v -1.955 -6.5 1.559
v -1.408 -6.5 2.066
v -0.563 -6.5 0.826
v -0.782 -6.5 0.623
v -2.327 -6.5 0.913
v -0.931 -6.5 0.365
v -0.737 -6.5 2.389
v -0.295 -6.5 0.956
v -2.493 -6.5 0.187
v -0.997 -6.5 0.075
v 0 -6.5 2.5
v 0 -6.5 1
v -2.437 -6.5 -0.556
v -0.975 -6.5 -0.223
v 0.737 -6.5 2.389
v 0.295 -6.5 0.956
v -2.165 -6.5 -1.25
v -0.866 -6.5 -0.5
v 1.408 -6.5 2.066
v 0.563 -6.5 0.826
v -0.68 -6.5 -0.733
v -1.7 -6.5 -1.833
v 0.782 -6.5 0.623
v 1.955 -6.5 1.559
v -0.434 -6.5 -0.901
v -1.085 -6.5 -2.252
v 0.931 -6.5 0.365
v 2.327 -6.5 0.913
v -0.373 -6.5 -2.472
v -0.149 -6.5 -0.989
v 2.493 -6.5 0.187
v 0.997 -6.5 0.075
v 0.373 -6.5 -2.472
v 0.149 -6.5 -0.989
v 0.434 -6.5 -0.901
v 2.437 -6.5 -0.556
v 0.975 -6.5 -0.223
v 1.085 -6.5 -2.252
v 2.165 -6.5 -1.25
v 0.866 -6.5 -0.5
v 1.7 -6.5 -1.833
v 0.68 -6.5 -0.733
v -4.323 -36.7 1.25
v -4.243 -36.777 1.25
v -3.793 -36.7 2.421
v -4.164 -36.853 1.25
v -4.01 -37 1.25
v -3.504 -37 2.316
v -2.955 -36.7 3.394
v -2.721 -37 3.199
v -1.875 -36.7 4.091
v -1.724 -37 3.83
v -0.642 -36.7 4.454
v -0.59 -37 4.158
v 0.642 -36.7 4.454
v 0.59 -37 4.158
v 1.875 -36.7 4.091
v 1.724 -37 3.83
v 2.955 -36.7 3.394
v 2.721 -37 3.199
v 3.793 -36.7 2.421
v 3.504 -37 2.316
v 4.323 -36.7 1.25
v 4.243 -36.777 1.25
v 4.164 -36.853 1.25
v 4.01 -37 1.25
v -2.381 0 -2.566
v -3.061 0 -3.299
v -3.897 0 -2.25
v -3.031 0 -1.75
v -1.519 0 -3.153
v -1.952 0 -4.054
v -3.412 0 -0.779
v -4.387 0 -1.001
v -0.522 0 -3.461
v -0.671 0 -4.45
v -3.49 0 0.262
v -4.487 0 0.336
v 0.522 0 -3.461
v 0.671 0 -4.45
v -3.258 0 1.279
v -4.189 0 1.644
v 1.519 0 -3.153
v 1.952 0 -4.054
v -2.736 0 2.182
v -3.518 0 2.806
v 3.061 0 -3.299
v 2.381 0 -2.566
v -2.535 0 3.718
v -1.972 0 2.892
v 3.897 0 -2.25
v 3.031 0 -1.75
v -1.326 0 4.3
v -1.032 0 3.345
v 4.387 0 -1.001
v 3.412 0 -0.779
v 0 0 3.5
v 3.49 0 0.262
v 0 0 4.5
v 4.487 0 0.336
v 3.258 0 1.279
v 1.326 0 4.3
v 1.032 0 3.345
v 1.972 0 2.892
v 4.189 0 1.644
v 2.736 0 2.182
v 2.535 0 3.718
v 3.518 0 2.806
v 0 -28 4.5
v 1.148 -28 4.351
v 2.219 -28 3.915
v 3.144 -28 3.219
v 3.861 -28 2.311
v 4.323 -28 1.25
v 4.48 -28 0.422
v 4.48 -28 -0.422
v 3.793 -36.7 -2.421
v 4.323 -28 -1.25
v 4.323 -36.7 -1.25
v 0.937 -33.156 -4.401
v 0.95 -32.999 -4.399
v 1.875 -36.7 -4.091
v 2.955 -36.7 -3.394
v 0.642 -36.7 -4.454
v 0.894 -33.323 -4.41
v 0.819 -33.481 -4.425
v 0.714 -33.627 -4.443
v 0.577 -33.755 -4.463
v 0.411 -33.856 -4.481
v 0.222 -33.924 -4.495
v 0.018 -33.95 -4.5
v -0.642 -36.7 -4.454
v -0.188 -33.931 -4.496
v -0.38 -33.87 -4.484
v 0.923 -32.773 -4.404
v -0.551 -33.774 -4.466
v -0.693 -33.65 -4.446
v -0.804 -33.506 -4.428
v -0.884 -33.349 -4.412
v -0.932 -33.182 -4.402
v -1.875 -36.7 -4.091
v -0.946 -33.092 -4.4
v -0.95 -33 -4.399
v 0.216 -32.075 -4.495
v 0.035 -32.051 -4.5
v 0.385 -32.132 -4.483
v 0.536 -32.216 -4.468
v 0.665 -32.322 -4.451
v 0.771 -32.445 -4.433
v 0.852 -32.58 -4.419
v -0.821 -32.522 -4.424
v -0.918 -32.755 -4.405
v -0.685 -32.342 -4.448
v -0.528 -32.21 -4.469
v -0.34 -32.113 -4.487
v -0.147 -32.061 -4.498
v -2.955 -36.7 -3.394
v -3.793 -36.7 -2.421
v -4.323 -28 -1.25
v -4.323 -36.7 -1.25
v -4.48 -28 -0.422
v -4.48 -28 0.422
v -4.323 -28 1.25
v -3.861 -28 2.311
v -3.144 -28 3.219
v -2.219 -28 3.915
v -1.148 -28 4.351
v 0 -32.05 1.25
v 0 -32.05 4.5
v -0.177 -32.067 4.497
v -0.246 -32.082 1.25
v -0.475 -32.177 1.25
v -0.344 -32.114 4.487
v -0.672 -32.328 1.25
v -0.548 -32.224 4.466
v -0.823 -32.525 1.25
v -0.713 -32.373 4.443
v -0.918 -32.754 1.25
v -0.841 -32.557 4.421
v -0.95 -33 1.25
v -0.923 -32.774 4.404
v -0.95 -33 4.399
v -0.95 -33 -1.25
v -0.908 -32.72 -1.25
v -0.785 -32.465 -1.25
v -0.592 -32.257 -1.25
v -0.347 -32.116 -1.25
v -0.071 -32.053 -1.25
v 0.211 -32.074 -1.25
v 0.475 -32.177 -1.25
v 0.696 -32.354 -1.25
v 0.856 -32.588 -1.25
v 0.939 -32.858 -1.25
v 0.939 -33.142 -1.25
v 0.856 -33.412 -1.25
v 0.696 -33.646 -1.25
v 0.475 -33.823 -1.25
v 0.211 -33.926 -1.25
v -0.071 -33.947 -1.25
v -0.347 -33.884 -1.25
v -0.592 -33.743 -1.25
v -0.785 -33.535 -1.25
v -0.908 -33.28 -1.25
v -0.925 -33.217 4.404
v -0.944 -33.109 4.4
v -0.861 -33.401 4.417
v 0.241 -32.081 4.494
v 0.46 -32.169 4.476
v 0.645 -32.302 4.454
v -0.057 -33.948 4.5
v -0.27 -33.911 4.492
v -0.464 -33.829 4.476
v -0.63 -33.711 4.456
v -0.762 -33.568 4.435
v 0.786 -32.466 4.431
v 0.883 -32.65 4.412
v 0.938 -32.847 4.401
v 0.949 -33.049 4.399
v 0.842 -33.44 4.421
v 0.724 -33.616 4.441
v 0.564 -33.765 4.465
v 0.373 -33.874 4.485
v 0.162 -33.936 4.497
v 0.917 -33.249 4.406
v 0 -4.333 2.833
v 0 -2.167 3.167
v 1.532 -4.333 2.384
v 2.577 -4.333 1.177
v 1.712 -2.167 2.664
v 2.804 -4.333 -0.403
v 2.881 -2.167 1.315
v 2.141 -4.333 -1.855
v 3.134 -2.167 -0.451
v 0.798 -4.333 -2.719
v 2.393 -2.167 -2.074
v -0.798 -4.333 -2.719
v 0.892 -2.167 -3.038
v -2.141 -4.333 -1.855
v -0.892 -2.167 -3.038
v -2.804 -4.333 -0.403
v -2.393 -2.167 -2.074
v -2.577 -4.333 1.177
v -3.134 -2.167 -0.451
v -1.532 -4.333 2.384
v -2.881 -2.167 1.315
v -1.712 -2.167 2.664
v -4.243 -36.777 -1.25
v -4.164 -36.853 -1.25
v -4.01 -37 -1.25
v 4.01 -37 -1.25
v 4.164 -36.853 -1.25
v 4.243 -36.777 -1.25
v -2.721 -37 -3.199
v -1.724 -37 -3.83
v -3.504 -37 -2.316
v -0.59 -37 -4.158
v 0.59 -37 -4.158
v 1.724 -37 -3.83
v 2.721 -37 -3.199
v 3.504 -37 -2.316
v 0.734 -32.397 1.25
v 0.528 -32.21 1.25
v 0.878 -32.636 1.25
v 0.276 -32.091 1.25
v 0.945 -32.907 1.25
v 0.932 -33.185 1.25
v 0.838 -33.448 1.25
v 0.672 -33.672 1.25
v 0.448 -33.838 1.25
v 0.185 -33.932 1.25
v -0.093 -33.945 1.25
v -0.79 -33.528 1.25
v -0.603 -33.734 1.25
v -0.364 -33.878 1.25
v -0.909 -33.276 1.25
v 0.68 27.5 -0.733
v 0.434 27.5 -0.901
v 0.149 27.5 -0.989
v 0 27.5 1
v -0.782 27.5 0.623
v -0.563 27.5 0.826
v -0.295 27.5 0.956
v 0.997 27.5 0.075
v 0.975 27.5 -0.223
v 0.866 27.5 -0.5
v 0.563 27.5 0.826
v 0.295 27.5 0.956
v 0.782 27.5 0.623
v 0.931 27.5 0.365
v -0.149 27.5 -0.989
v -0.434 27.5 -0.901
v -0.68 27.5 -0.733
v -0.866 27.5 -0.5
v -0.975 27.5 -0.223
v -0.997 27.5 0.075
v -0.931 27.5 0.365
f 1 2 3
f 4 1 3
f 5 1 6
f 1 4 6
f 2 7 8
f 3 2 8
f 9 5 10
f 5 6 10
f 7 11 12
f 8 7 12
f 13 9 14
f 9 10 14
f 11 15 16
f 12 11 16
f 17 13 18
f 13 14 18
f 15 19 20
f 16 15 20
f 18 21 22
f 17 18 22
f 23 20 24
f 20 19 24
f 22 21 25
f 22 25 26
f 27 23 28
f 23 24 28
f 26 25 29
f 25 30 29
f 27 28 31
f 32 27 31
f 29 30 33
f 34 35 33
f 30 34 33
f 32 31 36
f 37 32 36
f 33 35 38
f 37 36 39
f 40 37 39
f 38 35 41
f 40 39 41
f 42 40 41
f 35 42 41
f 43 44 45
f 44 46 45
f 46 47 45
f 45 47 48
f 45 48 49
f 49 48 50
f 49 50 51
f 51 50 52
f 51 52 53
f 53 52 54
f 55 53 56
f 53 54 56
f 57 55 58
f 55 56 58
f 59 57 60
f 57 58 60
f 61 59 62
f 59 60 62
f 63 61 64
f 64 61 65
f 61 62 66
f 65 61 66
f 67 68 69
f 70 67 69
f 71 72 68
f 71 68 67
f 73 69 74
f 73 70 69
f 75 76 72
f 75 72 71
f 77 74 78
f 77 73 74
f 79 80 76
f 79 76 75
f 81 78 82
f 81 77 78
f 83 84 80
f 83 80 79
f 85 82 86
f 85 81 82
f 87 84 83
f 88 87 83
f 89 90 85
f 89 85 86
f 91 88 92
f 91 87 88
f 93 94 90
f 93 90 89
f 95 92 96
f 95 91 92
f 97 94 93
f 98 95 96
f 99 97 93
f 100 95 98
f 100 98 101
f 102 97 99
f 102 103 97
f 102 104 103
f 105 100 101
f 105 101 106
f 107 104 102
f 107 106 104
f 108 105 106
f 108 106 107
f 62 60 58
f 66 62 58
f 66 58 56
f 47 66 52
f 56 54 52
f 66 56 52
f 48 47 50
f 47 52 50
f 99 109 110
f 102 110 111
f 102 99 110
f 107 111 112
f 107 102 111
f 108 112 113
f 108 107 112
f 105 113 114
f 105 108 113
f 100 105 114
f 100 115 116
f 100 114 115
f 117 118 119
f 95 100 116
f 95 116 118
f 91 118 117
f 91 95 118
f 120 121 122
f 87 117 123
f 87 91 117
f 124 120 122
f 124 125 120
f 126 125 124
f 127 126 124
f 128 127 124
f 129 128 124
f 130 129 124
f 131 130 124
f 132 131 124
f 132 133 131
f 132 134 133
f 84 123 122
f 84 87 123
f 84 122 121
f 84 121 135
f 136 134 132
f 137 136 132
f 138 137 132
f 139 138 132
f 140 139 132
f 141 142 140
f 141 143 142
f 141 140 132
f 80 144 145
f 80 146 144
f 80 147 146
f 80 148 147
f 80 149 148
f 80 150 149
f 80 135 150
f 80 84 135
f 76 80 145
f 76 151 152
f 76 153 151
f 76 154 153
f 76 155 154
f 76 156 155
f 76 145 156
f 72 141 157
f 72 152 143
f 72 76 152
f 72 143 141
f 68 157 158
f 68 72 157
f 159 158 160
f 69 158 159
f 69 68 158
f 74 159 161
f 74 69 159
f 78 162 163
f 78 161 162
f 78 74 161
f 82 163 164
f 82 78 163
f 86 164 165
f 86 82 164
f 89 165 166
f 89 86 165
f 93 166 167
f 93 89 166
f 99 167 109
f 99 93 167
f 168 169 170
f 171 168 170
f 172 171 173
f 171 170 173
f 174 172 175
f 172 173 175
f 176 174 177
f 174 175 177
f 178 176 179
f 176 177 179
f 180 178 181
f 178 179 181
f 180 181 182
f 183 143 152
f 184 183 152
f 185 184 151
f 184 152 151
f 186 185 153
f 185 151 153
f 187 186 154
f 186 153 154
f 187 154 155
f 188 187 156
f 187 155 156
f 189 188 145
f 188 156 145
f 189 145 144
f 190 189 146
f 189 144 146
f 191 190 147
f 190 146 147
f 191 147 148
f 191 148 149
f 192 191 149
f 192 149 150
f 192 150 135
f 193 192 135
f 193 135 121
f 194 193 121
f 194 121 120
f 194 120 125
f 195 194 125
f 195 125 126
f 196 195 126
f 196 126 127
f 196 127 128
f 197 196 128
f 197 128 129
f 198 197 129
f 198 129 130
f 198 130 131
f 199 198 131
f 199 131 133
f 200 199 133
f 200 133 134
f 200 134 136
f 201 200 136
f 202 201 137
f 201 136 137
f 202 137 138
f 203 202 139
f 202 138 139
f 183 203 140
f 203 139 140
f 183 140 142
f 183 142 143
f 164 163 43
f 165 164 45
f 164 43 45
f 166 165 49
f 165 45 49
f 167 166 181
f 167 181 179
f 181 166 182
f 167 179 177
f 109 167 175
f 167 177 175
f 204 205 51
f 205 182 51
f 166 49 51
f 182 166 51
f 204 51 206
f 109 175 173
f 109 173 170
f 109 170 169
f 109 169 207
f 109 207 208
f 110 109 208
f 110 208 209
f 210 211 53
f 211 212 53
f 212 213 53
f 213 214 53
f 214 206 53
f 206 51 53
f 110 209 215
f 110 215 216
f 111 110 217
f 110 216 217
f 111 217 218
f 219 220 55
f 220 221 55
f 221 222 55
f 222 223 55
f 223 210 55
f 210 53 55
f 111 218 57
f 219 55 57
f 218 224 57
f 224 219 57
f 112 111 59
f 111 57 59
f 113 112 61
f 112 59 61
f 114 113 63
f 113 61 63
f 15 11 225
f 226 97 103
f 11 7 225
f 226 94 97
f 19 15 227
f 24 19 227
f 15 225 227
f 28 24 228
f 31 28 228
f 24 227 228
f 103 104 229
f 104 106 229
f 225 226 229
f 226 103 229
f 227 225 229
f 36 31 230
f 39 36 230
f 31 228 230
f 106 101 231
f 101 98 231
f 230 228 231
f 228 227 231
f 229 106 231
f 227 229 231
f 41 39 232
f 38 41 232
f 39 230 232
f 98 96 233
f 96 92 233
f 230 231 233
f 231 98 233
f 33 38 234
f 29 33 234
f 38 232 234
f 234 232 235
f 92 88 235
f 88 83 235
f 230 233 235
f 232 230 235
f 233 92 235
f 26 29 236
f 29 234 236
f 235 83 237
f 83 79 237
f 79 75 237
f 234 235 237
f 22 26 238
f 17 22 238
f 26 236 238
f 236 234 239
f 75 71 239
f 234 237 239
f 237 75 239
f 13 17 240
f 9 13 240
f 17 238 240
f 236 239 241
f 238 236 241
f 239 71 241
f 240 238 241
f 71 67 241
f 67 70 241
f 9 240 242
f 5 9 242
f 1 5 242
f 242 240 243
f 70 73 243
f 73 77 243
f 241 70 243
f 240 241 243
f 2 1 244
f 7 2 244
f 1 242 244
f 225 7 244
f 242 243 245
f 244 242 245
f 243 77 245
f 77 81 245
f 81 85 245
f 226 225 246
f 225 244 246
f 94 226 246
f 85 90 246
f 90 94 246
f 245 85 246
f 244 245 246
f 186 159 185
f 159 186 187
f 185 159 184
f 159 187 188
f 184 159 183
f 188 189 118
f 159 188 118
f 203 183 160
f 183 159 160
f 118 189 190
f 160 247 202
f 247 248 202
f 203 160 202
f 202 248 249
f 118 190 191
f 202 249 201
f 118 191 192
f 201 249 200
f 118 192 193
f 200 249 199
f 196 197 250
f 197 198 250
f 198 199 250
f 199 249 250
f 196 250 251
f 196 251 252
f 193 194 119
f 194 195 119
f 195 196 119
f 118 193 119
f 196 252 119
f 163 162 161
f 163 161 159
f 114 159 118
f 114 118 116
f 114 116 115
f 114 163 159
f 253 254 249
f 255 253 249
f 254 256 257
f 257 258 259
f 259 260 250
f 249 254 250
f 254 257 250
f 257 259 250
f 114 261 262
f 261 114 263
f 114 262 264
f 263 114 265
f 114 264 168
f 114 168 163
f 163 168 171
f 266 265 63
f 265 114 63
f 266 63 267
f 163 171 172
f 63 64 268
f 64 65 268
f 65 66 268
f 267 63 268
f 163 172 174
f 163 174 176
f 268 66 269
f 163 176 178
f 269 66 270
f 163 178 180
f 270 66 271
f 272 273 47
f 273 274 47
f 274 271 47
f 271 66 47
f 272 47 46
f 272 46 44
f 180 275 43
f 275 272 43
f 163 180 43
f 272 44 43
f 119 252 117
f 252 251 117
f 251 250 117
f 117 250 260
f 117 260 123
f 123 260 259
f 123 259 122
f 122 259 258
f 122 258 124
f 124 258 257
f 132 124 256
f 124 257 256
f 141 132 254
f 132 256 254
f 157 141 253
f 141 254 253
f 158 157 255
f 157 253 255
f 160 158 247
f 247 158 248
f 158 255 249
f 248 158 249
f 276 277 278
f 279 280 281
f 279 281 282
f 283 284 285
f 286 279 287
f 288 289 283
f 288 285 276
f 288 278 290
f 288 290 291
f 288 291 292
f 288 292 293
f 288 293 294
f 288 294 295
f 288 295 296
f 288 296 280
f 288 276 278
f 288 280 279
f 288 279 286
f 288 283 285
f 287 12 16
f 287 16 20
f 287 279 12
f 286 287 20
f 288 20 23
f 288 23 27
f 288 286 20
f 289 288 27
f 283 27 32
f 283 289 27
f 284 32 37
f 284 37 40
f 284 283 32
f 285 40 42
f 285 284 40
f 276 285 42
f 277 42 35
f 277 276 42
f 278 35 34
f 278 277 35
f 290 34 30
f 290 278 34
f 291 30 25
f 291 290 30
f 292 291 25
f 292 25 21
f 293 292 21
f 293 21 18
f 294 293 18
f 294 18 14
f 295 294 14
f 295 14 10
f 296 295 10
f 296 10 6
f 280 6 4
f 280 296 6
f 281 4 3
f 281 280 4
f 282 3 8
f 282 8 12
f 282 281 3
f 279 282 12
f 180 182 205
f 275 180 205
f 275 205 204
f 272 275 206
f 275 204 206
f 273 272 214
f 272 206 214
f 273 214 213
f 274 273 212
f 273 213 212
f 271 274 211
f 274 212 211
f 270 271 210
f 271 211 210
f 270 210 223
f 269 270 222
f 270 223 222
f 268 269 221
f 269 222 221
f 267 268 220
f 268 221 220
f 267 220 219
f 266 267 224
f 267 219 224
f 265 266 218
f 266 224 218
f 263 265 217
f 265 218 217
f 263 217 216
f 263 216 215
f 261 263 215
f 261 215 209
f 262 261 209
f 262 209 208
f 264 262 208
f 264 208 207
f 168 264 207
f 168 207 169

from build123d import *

# Parameters (mm, degrees)
SZKIC1_W                    = 4.5
SZKIC1_H                    = 37
WYTNIJ_WYCI_GNI_CIE1_DEPTH  = 9
DODANIE_WYCI_GNI_CIE1_START = 9
DODANIE_WYCI_GNI_CIE1_DEPTH = 9
SZKIC6_W                    = 1
SZKIC6_H                    = 34
SZKIC7_W                    = 0.95
SZKIC7_H                    = 3.25
OTW_R_1_9_1_9_2_D           = 1.9
SFAZOWANIE1_SIZE            = 0.3


with BuildPart() as part:
    # Szkic1 → Obrót1 (revolve)
    with BuildSketch(Plane(origin=(0, 0, 0), x_dir=(-1, 0, 0), z_dir=(0, 0, -1)), mode=Mode.PRIVATE) as obr_t1_sk:
        with Locations((-2.25, -18.5)):
            Rectangle(SZKIC1_W, SZKIC1_H)
    revolve(obr_t1_sk.sketch.rotate(Axis((0, -37, 0), (0, 1, 0)), 270), axis=Axis((0, -37, 0), (0, 1, 0)))

    # Szkic2 → Wytnij-wyciągnięcie1 (cut)
    with BuildSketch(Plane.XZ.offset(37)):
        with BuildLine():
            Line((-4.322904116, -1.25), (4.322904116, -1.25))
            ThreePointArc((4.322904116, -1.25), (0, 4.5), (-4.322904116, -1.25))
        make_face()
    extrude(amount=-WYTNIJ_WYCI_GNI_CIE1_DEPTH, mode=Mode.SUBTRACT)

    # Szkic3 → Dodanie-wyciągnięcie1 (add)
    with BuildSketch(Plane.XZ.offset(28).offset(DODANIE_WYCI_GNI_CIE1_START)):
        with BuildLine():
            Line((4.322904116, 1.25), (-4.322904116, 1.25))
            ThreePointArc((-4.322904116, 1.25), (0, 4.5), (4.322904116, 1.25))
        make_face()
    extrude(amount=-DODANIE_WYCI_GNI_CIE1_DEPTH)

    # Szkic4 → Otwór1 (revolve, cut)
    with BuildSketch(Plane(origin=(0, 0, 0), x_dir=(0, 0, 1), z_dir=(1, 0, 0))):
        Polygon((0, 0), (0, 6.5), (2.5, 6.5), (3.5, 0), align=None)
    revolve(axis=Axis((0, -110, 0), (0, 1, 0)), mode=Mode.SUBTRACT)

    # Szkic6 → Obrót2 (revolve)
    with BuildSketch(Plane(origin=(0, 0, 0), x_dir=(-1, 0, 0), z_dir=(0, 0, -1)), mode=Mode.PRIVATE) as obr_t2_sk:
        with Locations((-0.5, 10.5)):
            Rectangle(SZKIC6_W, SZKIC6_H)
    revolve(obr_t2_sk.sketch.rotate(Axis((0, -6.5, 0), (0, 1, 0)), 270), axis=Axis((0, -6.5, 0), (0, 1, 0)))

    # Szkic7 → Otwór Ø1.9 (1.9)1 (revolve, cut)
    with BuildSketch(Plane(origin=(0, -33, 1.25), x_dir=(0, 1, 0), z_dir=(1, 0, 0))):
        with Locations((0.475, 1.625)):
            Rectangle(SZKIC7_W, SZKIC7_H)
    revolve(axis=Axis((0, -33, -5.1), (0, 0, 1)), mode=Mode.SUBTRACT)

    # Otwór Ø1.9 (1.9)2 (through all)
    with Locations(Plane.XY.offset(-1.25)):
        with Locations((0, -33)):
            Hole(OTW_R_1_9_1_9_2_D / 2)

    # Sfazowanie1
    sfazowanie1_edges = [part.edges().sort_by_distance(p)[0] for p in [
        (0, -37, 4.5),
        (0, -37, -4.5),
    ]]
    chamfer(sfazowanie1_edges, length=SFAZOWANIE1_SIZE)


solid = part.part
